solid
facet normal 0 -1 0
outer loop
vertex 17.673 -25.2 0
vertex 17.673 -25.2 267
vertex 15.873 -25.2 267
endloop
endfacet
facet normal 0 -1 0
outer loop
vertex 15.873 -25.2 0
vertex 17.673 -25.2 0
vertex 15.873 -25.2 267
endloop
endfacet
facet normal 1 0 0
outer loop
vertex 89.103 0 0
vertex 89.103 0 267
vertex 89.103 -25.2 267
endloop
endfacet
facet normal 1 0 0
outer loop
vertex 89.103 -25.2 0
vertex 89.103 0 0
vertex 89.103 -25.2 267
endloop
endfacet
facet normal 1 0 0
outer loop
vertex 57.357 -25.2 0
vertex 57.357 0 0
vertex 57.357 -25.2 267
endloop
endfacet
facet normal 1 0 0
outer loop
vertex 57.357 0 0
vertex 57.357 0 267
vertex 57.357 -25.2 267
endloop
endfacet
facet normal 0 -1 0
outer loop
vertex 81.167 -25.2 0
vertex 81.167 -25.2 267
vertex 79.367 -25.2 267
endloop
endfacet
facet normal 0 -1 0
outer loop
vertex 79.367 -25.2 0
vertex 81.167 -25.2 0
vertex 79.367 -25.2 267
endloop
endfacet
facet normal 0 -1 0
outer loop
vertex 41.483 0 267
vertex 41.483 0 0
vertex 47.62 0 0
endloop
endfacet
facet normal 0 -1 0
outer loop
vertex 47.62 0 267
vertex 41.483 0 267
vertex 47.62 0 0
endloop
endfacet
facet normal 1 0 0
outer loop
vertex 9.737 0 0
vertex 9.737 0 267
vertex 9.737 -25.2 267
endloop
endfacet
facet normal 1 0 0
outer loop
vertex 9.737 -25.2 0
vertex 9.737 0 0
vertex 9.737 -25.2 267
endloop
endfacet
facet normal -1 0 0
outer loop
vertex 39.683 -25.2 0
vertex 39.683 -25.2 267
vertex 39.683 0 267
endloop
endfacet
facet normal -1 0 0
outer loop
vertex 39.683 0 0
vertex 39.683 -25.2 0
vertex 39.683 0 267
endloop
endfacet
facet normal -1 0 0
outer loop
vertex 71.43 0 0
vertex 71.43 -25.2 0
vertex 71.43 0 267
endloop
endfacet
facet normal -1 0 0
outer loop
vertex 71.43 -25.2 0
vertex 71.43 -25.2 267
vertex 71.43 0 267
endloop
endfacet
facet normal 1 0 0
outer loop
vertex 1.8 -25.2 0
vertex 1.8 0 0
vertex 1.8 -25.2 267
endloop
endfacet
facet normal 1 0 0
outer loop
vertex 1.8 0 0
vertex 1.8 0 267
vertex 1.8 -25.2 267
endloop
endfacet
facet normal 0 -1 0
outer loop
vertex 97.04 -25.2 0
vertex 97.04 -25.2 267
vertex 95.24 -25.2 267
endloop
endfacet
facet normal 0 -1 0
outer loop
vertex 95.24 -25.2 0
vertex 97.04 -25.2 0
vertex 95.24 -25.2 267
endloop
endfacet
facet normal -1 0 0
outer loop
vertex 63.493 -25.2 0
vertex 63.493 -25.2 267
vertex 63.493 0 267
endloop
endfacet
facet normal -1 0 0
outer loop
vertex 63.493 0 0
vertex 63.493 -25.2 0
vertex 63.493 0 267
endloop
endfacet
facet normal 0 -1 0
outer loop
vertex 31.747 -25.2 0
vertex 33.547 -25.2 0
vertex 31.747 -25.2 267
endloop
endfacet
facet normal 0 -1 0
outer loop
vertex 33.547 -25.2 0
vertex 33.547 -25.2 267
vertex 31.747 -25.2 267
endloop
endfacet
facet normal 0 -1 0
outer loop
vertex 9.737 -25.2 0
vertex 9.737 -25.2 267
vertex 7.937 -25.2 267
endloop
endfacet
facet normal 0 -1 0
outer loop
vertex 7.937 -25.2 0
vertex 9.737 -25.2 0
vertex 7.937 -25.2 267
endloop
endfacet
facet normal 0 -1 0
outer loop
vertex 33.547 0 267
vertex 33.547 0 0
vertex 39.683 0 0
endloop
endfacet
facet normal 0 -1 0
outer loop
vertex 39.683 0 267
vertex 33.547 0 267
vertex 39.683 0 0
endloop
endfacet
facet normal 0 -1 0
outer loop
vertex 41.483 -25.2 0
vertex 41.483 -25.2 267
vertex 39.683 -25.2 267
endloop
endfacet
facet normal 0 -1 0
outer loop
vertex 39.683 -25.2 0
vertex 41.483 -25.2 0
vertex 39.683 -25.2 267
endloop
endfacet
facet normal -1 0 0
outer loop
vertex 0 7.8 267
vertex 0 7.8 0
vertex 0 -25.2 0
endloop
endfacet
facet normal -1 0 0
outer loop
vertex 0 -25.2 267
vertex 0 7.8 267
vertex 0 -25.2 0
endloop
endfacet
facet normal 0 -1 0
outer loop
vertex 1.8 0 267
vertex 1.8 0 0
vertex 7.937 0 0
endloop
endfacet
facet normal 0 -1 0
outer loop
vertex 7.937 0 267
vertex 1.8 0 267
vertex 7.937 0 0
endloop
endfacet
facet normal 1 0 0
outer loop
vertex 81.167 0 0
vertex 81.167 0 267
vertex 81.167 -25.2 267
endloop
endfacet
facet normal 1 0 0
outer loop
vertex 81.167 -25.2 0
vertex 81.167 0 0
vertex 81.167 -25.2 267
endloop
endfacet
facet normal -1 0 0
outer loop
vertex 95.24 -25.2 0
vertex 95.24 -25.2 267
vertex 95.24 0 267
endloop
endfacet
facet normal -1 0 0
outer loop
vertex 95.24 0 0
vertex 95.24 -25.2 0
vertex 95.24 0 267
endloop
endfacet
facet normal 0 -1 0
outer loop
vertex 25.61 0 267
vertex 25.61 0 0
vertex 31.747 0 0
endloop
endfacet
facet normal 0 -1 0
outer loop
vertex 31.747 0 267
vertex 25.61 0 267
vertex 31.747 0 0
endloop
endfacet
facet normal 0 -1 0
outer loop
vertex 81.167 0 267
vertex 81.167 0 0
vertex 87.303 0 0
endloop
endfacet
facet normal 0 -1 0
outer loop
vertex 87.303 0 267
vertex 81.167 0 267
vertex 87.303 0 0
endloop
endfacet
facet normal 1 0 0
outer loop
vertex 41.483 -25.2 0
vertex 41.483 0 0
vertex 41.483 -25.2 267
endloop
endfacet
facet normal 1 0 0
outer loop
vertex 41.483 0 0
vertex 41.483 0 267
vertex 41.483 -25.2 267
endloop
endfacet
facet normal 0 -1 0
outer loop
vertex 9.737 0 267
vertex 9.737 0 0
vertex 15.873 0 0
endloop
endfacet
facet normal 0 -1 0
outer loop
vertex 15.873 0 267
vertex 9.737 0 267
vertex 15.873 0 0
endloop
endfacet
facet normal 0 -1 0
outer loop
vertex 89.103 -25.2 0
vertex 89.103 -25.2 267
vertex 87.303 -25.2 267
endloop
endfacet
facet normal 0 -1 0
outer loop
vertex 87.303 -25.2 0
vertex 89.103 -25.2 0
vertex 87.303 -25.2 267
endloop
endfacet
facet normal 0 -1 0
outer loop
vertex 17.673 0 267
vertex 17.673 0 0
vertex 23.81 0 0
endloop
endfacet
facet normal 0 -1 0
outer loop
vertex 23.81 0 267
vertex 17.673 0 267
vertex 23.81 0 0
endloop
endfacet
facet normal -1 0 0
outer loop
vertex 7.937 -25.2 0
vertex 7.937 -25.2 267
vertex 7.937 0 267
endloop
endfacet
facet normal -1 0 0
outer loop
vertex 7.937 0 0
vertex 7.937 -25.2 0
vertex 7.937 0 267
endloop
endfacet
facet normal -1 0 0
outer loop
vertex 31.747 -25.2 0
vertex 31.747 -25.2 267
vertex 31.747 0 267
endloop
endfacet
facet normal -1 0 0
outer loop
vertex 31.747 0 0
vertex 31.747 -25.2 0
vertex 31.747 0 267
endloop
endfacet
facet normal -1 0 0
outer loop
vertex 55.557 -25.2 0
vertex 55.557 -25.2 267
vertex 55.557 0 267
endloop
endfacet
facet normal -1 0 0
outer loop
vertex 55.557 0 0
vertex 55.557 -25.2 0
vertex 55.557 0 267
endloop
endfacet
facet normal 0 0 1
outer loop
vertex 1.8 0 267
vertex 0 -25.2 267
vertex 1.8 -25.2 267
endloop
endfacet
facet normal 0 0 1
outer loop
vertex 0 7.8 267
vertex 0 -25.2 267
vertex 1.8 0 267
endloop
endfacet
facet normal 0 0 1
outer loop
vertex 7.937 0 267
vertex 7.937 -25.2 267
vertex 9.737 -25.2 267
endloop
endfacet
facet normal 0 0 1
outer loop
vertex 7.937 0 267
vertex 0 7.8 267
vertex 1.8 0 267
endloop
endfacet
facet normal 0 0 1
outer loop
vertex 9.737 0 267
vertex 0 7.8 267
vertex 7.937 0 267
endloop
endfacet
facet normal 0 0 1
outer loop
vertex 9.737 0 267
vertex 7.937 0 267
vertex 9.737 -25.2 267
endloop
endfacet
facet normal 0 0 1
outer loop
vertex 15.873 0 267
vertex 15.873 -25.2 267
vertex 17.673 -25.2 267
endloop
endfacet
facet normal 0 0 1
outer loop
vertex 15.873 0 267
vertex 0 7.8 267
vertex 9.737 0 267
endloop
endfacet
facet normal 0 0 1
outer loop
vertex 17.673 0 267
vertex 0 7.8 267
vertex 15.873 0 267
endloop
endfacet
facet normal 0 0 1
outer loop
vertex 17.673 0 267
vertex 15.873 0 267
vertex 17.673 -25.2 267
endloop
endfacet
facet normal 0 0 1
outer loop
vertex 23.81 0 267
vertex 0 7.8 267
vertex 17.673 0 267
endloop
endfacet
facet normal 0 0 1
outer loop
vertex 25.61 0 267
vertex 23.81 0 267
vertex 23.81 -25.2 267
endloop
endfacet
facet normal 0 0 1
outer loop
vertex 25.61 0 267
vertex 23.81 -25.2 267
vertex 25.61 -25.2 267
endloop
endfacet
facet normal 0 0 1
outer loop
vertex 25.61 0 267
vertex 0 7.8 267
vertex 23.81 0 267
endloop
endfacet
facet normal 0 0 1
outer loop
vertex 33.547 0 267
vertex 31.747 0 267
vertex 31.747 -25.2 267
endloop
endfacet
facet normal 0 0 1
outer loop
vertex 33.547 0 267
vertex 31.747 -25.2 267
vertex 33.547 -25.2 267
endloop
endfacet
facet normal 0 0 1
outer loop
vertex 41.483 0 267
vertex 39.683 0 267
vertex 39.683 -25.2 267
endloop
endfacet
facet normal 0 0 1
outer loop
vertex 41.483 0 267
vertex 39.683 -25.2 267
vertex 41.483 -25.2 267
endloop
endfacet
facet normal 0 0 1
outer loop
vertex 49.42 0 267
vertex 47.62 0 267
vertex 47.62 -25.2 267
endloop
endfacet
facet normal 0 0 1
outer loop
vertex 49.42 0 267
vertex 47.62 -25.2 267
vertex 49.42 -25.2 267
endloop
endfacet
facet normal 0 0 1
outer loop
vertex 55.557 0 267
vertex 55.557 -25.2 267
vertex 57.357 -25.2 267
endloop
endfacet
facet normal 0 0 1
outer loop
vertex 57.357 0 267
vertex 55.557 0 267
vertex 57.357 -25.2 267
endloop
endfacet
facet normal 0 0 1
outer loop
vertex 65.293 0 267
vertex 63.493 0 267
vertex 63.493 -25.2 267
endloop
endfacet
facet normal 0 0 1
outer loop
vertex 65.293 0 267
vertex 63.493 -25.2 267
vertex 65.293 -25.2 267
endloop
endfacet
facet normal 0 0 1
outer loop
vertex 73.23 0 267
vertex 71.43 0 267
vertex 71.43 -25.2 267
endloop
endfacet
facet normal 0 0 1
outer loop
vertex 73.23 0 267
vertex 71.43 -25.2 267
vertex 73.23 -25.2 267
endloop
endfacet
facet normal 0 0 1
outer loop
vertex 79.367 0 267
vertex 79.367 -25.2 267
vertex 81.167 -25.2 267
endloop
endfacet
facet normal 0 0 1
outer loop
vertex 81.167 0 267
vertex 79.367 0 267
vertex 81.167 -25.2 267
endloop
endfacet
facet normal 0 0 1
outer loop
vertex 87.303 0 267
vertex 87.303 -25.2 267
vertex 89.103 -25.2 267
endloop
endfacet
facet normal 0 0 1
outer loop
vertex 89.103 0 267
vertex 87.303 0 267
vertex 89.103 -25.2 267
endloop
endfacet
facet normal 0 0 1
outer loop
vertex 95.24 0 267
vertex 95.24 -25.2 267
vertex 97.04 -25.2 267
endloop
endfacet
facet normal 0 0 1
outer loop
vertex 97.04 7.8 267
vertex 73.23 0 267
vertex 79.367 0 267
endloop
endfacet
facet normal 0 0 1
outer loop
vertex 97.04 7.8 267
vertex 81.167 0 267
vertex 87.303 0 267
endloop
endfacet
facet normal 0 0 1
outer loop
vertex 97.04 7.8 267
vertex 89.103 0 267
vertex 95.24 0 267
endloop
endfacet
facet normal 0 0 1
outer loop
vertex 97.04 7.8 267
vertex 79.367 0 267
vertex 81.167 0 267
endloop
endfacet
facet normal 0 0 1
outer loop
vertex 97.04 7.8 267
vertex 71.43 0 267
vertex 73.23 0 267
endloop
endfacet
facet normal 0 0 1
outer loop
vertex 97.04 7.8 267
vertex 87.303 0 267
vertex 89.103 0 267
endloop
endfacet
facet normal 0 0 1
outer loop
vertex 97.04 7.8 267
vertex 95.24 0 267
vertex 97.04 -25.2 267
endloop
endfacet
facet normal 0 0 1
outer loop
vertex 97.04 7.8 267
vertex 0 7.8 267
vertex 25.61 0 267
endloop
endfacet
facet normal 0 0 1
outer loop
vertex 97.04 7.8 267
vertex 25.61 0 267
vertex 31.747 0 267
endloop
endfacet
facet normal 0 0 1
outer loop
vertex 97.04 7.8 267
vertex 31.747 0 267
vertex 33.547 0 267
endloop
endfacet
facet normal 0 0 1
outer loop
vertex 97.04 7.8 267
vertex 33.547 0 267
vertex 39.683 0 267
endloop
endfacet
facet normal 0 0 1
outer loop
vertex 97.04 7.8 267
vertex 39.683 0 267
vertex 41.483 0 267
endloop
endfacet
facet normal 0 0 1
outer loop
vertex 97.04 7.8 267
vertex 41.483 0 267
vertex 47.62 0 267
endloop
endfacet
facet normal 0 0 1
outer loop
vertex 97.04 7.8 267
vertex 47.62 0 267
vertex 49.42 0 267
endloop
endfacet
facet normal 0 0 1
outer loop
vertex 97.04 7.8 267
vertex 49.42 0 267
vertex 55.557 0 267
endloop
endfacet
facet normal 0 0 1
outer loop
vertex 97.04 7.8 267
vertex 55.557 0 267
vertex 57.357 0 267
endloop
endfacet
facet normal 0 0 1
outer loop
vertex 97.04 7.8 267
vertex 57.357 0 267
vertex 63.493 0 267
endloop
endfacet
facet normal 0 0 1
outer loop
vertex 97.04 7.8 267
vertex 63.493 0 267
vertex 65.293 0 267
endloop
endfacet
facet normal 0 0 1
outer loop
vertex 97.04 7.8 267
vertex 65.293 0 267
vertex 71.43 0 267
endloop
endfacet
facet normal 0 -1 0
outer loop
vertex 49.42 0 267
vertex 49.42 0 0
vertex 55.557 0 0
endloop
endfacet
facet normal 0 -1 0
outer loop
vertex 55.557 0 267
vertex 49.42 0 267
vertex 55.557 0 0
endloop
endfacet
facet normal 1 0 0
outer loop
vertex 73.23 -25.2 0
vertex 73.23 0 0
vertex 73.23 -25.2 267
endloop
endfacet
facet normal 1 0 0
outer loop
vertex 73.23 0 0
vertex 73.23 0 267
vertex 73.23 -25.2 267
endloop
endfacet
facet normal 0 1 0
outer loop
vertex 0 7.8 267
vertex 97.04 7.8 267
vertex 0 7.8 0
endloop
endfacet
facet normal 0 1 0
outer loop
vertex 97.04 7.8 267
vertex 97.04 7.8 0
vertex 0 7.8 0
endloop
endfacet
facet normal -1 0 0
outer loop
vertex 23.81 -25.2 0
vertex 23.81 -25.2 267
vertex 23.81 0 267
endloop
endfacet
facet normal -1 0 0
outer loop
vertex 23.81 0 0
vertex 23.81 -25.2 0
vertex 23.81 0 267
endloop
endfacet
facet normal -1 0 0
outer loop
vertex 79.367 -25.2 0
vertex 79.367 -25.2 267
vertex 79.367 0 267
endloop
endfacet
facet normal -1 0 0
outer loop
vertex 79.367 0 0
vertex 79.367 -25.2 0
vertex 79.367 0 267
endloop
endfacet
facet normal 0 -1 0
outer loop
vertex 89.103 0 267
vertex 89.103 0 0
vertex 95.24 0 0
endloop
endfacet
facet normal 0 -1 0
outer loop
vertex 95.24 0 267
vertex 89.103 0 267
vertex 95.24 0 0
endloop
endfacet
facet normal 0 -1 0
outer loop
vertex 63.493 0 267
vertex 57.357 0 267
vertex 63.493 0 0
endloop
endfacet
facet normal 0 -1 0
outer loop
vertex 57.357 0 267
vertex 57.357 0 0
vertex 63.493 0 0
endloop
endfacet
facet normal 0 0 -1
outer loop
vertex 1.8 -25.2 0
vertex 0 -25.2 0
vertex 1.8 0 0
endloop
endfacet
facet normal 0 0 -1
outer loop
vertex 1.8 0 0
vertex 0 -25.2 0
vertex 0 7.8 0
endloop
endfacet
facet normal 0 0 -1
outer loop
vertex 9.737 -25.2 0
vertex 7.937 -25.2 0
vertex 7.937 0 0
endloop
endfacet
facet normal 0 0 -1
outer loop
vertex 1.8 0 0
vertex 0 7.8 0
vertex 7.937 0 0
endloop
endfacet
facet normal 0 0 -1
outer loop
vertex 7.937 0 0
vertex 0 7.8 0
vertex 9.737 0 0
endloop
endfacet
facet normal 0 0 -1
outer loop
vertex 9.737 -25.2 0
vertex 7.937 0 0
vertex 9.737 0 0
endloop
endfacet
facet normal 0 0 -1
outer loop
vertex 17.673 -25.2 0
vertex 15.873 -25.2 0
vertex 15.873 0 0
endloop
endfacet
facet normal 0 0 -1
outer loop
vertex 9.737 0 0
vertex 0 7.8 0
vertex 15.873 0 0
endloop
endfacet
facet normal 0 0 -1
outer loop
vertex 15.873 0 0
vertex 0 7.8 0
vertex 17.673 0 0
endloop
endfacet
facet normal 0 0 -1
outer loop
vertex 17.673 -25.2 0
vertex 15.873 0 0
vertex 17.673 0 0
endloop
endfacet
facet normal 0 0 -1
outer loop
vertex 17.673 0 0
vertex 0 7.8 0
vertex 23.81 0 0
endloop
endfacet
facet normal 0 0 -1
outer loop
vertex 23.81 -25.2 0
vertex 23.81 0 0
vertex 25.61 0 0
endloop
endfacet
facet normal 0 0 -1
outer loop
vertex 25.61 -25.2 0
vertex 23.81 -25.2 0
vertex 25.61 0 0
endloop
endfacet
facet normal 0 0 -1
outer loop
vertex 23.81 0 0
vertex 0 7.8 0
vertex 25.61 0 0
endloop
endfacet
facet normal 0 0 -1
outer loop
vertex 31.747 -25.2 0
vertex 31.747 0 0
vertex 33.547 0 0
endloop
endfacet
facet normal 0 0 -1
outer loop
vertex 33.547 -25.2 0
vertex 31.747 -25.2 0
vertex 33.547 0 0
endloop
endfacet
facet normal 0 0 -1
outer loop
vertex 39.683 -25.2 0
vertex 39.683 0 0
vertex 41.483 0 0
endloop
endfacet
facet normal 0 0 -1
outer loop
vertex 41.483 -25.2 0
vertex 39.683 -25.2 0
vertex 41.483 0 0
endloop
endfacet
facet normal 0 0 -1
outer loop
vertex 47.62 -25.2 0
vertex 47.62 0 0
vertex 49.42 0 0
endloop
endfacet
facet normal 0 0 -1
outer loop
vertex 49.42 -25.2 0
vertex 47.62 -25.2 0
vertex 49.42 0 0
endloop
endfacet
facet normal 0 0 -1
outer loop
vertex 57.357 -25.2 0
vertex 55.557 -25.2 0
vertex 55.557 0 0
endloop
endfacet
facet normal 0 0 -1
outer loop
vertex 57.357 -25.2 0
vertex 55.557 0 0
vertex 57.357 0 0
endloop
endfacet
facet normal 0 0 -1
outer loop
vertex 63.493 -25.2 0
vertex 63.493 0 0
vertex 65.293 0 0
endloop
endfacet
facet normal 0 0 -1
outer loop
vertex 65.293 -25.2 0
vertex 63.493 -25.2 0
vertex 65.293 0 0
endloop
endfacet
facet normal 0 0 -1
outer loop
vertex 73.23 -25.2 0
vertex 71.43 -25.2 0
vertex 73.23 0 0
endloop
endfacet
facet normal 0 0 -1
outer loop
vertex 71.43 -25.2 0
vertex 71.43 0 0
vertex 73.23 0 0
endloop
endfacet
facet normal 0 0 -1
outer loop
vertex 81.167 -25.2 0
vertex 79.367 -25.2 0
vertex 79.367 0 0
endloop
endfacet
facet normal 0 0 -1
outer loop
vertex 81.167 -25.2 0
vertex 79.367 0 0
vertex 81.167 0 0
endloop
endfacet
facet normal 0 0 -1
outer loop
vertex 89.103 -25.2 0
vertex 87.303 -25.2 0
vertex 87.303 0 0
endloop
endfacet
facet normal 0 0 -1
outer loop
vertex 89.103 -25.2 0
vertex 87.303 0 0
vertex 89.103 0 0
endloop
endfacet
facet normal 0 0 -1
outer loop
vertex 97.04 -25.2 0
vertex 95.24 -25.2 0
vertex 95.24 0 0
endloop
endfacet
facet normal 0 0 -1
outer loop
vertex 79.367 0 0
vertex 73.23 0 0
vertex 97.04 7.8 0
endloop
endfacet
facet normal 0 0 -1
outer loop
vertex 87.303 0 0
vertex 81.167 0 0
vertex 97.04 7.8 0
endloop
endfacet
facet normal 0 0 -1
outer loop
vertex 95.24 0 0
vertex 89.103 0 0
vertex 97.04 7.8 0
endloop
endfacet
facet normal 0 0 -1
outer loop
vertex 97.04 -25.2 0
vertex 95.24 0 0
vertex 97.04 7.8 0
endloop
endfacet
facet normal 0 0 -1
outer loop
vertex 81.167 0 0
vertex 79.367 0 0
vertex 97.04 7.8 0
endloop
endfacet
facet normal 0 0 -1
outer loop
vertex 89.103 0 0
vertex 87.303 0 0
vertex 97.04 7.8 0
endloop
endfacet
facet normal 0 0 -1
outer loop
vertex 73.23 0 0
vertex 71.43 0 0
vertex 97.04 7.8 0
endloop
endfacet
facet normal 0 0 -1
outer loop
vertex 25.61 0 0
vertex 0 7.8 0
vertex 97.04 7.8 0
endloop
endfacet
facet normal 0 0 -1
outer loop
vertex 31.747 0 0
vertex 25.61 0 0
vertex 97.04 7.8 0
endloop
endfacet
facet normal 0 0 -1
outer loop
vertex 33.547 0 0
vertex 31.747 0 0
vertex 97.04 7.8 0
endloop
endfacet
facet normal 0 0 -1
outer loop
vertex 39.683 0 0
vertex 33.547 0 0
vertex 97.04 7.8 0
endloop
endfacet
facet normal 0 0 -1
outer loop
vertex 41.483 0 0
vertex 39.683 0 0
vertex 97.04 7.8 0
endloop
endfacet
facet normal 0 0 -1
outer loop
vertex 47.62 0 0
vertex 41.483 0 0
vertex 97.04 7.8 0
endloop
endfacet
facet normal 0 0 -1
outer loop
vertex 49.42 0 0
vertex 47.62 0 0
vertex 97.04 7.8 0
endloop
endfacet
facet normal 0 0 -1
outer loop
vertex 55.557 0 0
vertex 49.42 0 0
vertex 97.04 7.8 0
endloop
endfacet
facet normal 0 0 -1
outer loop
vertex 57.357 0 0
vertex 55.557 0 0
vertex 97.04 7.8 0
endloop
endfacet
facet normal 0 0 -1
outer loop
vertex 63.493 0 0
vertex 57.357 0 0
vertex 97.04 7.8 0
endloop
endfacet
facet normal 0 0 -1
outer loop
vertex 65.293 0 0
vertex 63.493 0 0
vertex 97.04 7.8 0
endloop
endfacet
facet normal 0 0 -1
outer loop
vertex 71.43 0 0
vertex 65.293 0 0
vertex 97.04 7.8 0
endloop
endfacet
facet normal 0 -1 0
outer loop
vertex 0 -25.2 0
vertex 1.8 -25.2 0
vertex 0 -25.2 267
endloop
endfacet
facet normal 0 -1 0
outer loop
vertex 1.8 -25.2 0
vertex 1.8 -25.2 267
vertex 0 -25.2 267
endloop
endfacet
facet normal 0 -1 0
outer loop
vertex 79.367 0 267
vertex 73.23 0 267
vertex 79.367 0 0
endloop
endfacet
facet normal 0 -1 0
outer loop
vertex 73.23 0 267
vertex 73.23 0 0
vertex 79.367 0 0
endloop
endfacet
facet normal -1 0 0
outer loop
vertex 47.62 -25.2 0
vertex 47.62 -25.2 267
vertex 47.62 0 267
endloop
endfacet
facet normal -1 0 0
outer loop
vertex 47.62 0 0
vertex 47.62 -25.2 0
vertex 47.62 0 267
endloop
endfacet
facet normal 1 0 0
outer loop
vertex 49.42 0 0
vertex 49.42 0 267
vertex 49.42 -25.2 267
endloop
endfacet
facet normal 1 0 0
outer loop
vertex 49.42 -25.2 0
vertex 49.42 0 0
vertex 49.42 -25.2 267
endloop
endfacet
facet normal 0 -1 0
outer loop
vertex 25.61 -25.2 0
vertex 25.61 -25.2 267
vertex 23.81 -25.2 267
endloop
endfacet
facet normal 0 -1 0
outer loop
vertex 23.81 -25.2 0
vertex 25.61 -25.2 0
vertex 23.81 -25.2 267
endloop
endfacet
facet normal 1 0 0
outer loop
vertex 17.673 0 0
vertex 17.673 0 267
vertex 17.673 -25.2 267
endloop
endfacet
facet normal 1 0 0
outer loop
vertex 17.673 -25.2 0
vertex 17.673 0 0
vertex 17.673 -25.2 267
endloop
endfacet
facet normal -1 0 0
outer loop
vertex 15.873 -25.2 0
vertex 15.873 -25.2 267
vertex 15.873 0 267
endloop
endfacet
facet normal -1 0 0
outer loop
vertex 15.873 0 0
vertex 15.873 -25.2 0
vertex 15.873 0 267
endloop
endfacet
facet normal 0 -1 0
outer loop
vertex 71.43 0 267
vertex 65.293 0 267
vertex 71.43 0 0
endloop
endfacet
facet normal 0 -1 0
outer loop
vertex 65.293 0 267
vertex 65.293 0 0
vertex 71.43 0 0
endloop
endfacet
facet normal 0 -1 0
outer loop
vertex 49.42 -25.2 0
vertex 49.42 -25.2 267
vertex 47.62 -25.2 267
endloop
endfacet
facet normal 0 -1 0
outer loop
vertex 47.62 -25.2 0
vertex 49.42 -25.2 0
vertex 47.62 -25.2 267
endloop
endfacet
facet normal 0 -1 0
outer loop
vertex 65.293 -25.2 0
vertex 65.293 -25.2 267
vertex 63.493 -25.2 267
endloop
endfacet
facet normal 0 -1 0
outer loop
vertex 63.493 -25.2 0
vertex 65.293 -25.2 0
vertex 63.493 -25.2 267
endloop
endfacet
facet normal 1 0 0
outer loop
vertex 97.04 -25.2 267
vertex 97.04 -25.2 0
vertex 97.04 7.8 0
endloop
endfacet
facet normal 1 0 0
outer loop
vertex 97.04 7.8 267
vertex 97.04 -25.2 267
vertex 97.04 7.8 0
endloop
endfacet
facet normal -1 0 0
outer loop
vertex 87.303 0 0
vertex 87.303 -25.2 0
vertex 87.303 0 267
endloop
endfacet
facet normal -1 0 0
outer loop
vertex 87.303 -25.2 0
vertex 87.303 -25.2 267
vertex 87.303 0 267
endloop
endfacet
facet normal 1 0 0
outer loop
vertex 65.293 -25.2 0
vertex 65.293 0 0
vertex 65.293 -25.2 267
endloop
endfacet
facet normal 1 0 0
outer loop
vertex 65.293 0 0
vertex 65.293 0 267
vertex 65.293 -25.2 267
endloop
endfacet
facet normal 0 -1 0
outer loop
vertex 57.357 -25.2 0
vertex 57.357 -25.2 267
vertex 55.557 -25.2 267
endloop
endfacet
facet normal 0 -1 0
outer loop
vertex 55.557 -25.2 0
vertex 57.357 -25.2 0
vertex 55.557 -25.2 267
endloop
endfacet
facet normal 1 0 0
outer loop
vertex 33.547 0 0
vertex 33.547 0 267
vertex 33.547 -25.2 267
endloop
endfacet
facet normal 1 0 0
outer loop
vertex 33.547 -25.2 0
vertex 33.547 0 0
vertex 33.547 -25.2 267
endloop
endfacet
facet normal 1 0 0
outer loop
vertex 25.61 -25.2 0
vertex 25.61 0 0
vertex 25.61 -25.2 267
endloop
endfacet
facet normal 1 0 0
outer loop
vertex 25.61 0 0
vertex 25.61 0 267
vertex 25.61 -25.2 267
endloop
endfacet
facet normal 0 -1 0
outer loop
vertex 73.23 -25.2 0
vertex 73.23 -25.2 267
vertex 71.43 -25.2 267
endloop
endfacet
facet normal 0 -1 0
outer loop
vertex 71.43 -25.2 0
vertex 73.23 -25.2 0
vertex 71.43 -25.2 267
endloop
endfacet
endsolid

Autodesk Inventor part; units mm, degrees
ref_plane "YZ Plane" through (0, 0, 0) normal (1, 0, 0) x (0, 1, 0)
ref_plane "XZ Plane" through (0, 0, 0) normal (0, 1, 0) x (-1, 0, 0)
ref_plane "XY Plane" through (0, 0, 0) normal (0, 0, 1) x (1, 0, 0)
sketch "Sketch4" plane through (0, 0, 0) normal (0, 0, 1) x (1, 0, 0)
  line L0 (0, 0) -> (97.04, 0)
  line L1 (97.04, 0) -> (97.04, 7.8)
  line L2 (97.04, 7.8) -> (0, 7.8)
  line L3 (0, 7.8) -> (0, 0)
  dimension "d15" = 97.04
  dimension "d16" = 7.8
extrude "Extrusion3" add sketch "Sketch4" along normal blind 267
sketch "Sketch5" plane through (0, 0, 267) normal (0, 0, 1) x (1, 0, 0)
  line L0 (0, 0) -> (97.04, 0) projected
  line L1 (0, 0) -> (1.8, 0)
  line L2 (1.8, 0) -> (1.8, -25.2)
  line L3 (1.8, -25.2) -> (0, -25.2)
  line L4 (0, -25.2) -> (0, 0)
  line L5 (9.7367, 0) -> (9.7367, -25.2)
  line L6 (7.9367, 0) -> (9.7367, 0)
  line L7 (7.9367, -25.2) -> (7.9367, 0)
  line L8 (9.7367, -25.2) -> (7.9367, -25.2)
  line L9 (17.6733, 0) -> (17.6733, -25.2)
  line L10 (15.8733, 0) -> (17.6733, 0)
  line L11 (15.8733, -25.2) -> (15.8733, 0)
  line L12 (17.6733, -25.2) -> (15.8733, -25.2)
  line L13 (25.61, 0) -> (25.61, -25.2)
  line L14 (23.81, 0) -> (25.61, 0)
  line L15 (23.81, -25.2) -> (23.81, 0)
  line L16 (25.61, -25.2) -> (23.81, -25.2)
  line L17 (33.5467, 0) -> (33.5467, -25.2)
  line L18 (31.7467, 0) -> (33.5467, 0)
  line L19 (31.7467, -25.2) -> (31.7467, 0)
  line L20 (33.5467, -25.2) -> (31.7467, -25.2)
  line L21 (41.4833, 0) -> (41.4833, -25.2)
  line L22 (39.6833, 0) -> (41.4833, 0)
  line L23 (39.6833, -25.2) -> (39.6833, 0)
  line L24 (41.4833, -25.2) -> (39.6833, -25.2)
  line L25 (49.42, 0) -> (49.42, -25.2)
  line L26 (47.62, 0) -> (49.42, 0)
  line L27 (47.62, -25.2) -> (47.62, 0)
  line L28 (49.42, -25.2) -> (47.62, -25.2)
  line L29 (57.3567, 0) -> (57.3567, -25.2)
  line L30 (55.5567, 0) -> (57.3567, 0)
  line L31 (55.5567, -25.2) -> (55.5567, 0)
  line L32 (57.3567, -25.2) -> (55.5567, -25.2)
  line L33 (65.2933, 0) -> (65.2933, -25.2)
  line L34 (63.4933, 0) -> (65.2933, 0)
  line L35 (63.4933, -25.2) -> (63.4933, 0)
  line L36 (65.2933, -25.2) -> (63.4933, -25.2)
  line L37 (73.23, 0) -> (73.23, -25.2)
  line L38 (71.43, 0) -> (73.23, 0)
  line L39 (71.43, -25.2) -> (71.43, 0)
  line L40 (73.23, -25.2) -> (71.43, -25.2)
  line L41 (81.1667, 0) -> (81.1667, -25.2)
  line L42 (79.3667, 0) -> (81.1667, 0)
  line L43 (79.3667, -25.2) -> (79.3667, 0)
  line L44 (81.1667, -25.2) -> (79.3667, -25.2)
  line L45 (89.1033, 0) -> (89.1033, -25.2)
  line L46 (87.3033, 0) -> (89.1033, 0)
  line L47 (87.3033, -25.2) -> (87.3033, 0)
  line L48 (89.1033, -25.2) -> (87.3033, -25.2)
  line L49 (97.04, 0) -> (97.04, -25.2)
  line L50 (95.24, 0) -> (97.04, 0)
  line L51 (95.24, -25.2) -> (95.24, 0)
  line L52 (97.04, -25.2) -> (95.24, -25.2)
  dimension "d19" = 1.8
  dimension "d20" = 25.2
  dimension "d23" = 7.9367
extrude "Extrusion4" add sketch "Sketch5" against normal up to surface (267 mm away)
properties part number "heat sink"
